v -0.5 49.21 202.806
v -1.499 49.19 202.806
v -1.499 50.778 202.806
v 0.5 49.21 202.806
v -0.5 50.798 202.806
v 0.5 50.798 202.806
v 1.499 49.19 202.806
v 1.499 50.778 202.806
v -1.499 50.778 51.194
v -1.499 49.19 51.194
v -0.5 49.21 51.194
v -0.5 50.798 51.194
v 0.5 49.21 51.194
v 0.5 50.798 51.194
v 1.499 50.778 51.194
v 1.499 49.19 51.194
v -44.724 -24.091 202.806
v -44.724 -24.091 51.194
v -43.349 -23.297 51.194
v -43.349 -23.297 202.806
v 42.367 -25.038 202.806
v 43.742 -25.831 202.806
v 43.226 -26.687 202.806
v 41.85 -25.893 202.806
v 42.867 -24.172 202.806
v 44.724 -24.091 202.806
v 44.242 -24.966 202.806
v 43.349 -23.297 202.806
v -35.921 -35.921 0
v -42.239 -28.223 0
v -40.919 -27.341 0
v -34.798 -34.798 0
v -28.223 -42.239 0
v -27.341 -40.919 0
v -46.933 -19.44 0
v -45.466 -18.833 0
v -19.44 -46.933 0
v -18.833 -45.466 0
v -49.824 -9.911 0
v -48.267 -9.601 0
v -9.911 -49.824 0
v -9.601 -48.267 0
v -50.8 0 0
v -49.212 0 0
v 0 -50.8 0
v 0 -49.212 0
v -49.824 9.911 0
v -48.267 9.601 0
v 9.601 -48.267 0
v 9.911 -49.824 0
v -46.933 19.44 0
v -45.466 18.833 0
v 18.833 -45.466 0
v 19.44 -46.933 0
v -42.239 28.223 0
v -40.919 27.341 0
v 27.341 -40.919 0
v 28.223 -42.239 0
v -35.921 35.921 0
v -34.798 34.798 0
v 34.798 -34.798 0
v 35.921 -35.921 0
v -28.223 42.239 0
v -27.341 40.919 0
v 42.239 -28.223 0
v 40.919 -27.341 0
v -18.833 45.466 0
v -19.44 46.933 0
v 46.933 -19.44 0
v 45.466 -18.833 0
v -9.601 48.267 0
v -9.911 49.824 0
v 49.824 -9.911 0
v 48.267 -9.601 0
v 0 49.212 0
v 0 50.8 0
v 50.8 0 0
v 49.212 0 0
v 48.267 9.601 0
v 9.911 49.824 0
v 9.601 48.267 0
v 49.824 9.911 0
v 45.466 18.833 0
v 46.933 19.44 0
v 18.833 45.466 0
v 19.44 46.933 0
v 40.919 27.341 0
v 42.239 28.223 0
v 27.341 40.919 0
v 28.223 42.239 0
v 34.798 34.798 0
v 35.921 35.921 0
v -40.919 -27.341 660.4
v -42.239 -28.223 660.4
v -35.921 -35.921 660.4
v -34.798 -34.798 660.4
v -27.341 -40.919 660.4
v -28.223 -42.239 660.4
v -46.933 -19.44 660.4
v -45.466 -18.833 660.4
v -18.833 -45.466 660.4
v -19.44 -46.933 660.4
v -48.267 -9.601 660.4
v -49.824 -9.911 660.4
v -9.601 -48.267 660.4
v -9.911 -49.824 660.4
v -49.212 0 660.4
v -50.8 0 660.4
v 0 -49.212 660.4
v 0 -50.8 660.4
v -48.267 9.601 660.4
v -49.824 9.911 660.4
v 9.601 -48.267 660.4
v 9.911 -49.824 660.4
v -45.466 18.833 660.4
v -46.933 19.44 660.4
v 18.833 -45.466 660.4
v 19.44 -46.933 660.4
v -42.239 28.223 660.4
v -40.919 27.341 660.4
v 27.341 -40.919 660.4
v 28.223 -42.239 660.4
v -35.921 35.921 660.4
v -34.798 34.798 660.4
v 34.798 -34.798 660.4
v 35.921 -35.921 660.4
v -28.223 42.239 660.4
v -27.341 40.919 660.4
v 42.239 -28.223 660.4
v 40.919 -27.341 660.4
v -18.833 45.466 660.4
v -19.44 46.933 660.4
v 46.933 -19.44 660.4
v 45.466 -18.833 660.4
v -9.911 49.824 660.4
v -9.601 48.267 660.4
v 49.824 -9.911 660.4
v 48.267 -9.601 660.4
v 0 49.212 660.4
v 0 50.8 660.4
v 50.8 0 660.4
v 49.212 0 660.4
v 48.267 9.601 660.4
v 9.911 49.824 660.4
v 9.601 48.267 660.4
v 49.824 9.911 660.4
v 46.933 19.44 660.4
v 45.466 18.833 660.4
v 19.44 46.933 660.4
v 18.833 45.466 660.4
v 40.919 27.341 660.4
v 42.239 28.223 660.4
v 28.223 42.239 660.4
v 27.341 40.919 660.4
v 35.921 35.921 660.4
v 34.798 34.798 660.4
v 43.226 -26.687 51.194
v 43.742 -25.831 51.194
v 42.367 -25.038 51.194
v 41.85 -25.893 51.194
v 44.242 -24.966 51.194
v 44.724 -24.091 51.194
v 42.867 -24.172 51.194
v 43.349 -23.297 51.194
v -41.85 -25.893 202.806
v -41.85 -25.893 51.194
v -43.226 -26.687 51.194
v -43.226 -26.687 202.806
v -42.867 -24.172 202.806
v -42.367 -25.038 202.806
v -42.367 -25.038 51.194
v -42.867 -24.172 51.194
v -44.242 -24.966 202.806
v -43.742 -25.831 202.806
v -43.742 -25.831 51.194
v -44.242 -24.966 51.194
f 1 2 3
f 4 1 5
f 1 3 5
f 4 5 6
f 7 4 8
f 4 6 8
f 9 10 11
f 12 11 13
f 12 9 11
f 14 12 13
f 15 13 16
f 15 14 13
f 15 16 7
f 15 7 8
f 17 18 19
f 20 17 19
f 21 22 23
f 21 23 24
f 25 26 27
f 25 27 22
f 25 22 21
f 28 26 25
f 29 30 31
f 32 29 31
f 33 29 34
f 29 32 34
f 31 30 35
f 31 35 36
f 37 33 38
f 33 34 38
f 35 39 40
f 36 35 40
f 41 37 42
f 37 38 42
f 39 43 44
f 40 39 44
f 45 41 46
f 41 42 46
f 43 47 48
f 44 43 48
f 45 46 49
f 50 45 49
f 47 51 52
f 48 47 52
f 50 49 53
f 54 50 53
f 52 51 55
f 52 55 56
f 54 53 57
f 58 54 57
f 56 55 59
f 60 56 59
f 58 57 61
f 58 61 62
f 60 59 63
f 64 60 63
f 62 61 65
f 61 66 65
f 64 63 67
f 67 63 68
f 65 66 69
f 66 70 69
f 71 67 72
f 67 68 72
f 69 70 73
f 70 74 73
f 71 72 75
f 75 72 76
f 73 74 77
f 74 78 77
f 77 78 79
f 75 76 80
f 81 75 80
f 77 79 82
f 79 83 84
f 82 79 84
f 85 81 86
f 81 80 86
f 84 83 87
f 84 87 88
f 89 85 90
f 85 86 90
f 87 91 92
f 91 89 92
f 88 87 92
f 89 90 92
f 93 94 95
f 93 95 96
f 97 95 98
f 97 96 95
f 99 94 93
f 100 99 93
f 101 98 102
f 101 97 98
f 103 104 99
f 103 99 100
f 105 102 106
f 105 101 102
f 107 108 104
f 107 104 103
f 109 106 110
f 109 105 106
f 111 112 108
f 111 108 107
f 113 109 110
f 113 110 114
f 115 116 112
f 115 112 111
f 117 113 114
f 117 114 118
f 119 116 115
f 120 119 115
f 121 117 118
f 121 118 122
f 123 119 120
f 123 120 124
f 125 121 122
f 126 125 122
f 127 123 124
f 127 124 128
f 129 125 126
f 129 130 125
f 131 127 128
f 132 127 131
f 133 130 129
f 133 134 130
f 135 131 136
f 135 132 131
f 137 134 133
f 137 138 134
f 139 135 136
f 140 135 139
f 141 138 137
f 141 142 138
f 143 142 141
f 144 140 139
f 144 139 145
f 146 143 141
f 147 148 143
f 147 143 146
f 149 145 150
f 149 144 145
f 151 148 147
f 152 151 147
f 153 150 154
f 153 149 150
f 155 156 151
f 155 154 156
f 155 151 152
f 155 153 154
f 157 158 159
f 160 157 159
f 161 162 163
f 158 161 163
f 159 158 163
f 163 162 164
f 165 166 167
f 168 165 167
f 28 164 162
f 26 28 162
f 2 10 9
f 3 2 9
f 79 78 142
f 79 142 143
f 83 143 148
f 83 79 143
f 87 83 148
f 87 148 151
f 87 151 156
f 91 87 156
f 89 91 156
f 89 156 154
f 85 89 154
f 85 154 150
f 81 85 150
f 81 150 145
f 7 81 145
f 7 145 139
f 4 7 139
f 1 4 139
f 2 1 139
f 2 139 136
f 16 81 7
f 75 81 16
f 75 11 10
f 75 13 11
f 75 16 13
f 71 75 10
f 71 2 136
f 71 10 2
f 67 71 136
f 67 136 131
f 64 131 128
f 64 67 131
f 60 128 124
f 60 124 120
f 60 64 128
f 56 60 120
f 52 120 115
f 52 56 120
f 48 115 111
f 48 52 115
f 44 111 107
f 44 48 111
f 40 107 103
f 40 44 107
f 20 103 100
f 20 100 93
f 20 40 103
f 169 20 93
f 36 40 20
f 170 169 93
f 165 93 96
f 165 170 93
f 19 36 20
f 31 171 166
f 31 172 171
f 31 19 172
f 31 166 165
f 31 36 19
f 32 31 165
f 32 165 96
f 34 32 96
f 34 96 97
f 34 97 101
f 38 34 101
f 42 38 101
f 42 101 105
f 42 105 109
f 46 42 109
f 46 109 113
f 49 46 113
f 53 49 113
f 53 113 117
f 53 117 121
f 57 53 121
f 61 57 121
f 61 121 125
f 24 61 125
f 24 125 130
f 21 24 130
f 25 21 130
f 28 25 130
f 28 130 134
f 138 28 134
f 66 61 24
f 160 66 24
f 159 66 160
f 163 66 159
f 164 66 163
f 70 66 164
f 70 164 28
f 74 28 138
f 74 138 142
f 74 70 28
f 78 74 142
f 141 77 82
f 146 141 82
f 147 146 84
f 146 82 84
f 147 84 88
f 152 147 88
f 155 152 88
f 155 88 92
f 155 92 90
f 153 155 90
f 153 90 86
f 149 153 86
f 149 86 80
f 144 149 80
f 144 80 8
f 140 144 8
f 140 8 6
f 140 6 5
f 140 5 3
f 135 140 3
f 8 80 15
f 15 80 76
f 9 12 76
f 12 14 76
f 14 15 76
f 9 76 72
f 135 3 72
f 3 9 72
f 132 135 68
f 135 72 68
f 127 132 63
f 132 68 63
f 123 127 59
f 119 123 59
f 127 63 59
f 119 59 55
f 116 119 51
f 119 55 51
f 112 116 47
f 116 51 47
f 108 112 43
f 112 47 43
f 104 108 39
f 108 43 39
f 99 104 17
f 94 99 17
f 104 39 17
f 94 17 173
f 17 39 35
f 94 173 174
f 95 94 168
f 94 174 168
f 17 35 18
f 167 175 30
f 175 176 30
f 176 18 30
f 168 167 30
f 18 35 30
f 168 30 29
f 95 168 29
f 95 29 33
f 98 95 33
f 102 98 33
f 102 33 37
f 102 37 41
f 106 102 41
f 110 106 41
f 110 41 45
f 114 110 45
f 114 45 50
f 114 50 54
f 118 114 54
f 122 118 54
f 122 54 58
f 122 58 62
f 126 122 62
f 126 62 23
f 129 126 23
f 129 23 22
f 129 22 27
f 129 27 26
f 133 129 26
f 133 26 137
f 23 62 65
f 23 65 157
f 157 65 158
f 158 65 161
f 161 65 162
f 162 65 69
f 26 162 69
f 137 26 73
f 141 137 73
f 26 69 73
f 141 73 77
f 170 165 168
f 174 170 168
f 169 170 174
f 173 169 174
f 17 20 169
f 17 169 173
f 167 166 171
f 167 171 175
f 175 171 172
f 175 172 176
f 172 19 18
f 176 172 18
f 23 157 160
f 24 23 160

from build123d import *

# Parameters (mm, degrees)
SKETCH1_R           = 50.8
SKETCH1_R_2         = 49.2125
BOSS_EXTRUDE1_DEPTH = 660.4
CUT_EXTRUDE3_START  = 51.1937
SKETCH4_W           = 2.9972
SKETCH4_H           = 25.4
CUT_EXTRUDE3_DEPTH  = 151.6126


with BuildPart() as part:
    # Sketch1 → Boss-Extrude1 (new body)
    with BuildSketch(Plane.XY):
        Circle(SKETCH1_R)
        Circle(SKETCH1_R_2, mode=Mode.SUBTRACT)
    extrude(amount=BOSS_EXTRUDE1_DEPTH)

    # Sketch4 → Cut-Extrude3 (cut)
    with BuildSketch(Plane.XY.offset(CUT_EXTRUDE3_START)):
        Polygon((54.24331314, -33.04782567), (32.246267884, -20.34782567), (33.744867884, -17.75217433), (55.74191314, -30.45217433), align=None)
        with Locations((0, 50.8)):
            Rectangle(SKETCH4_W, SKETCH4_H)
        Polygon((-55.74191314, -30.45217433), (-33.744867884, -17.75217433), (-32.246267884, -20.34782567), (-54.24331314, -33.04782567), align=None)
    extrude(amount=CUT_EXTRUDE3_DEPTH, mode=Mode.SUBTRACT)


solid = part.part
